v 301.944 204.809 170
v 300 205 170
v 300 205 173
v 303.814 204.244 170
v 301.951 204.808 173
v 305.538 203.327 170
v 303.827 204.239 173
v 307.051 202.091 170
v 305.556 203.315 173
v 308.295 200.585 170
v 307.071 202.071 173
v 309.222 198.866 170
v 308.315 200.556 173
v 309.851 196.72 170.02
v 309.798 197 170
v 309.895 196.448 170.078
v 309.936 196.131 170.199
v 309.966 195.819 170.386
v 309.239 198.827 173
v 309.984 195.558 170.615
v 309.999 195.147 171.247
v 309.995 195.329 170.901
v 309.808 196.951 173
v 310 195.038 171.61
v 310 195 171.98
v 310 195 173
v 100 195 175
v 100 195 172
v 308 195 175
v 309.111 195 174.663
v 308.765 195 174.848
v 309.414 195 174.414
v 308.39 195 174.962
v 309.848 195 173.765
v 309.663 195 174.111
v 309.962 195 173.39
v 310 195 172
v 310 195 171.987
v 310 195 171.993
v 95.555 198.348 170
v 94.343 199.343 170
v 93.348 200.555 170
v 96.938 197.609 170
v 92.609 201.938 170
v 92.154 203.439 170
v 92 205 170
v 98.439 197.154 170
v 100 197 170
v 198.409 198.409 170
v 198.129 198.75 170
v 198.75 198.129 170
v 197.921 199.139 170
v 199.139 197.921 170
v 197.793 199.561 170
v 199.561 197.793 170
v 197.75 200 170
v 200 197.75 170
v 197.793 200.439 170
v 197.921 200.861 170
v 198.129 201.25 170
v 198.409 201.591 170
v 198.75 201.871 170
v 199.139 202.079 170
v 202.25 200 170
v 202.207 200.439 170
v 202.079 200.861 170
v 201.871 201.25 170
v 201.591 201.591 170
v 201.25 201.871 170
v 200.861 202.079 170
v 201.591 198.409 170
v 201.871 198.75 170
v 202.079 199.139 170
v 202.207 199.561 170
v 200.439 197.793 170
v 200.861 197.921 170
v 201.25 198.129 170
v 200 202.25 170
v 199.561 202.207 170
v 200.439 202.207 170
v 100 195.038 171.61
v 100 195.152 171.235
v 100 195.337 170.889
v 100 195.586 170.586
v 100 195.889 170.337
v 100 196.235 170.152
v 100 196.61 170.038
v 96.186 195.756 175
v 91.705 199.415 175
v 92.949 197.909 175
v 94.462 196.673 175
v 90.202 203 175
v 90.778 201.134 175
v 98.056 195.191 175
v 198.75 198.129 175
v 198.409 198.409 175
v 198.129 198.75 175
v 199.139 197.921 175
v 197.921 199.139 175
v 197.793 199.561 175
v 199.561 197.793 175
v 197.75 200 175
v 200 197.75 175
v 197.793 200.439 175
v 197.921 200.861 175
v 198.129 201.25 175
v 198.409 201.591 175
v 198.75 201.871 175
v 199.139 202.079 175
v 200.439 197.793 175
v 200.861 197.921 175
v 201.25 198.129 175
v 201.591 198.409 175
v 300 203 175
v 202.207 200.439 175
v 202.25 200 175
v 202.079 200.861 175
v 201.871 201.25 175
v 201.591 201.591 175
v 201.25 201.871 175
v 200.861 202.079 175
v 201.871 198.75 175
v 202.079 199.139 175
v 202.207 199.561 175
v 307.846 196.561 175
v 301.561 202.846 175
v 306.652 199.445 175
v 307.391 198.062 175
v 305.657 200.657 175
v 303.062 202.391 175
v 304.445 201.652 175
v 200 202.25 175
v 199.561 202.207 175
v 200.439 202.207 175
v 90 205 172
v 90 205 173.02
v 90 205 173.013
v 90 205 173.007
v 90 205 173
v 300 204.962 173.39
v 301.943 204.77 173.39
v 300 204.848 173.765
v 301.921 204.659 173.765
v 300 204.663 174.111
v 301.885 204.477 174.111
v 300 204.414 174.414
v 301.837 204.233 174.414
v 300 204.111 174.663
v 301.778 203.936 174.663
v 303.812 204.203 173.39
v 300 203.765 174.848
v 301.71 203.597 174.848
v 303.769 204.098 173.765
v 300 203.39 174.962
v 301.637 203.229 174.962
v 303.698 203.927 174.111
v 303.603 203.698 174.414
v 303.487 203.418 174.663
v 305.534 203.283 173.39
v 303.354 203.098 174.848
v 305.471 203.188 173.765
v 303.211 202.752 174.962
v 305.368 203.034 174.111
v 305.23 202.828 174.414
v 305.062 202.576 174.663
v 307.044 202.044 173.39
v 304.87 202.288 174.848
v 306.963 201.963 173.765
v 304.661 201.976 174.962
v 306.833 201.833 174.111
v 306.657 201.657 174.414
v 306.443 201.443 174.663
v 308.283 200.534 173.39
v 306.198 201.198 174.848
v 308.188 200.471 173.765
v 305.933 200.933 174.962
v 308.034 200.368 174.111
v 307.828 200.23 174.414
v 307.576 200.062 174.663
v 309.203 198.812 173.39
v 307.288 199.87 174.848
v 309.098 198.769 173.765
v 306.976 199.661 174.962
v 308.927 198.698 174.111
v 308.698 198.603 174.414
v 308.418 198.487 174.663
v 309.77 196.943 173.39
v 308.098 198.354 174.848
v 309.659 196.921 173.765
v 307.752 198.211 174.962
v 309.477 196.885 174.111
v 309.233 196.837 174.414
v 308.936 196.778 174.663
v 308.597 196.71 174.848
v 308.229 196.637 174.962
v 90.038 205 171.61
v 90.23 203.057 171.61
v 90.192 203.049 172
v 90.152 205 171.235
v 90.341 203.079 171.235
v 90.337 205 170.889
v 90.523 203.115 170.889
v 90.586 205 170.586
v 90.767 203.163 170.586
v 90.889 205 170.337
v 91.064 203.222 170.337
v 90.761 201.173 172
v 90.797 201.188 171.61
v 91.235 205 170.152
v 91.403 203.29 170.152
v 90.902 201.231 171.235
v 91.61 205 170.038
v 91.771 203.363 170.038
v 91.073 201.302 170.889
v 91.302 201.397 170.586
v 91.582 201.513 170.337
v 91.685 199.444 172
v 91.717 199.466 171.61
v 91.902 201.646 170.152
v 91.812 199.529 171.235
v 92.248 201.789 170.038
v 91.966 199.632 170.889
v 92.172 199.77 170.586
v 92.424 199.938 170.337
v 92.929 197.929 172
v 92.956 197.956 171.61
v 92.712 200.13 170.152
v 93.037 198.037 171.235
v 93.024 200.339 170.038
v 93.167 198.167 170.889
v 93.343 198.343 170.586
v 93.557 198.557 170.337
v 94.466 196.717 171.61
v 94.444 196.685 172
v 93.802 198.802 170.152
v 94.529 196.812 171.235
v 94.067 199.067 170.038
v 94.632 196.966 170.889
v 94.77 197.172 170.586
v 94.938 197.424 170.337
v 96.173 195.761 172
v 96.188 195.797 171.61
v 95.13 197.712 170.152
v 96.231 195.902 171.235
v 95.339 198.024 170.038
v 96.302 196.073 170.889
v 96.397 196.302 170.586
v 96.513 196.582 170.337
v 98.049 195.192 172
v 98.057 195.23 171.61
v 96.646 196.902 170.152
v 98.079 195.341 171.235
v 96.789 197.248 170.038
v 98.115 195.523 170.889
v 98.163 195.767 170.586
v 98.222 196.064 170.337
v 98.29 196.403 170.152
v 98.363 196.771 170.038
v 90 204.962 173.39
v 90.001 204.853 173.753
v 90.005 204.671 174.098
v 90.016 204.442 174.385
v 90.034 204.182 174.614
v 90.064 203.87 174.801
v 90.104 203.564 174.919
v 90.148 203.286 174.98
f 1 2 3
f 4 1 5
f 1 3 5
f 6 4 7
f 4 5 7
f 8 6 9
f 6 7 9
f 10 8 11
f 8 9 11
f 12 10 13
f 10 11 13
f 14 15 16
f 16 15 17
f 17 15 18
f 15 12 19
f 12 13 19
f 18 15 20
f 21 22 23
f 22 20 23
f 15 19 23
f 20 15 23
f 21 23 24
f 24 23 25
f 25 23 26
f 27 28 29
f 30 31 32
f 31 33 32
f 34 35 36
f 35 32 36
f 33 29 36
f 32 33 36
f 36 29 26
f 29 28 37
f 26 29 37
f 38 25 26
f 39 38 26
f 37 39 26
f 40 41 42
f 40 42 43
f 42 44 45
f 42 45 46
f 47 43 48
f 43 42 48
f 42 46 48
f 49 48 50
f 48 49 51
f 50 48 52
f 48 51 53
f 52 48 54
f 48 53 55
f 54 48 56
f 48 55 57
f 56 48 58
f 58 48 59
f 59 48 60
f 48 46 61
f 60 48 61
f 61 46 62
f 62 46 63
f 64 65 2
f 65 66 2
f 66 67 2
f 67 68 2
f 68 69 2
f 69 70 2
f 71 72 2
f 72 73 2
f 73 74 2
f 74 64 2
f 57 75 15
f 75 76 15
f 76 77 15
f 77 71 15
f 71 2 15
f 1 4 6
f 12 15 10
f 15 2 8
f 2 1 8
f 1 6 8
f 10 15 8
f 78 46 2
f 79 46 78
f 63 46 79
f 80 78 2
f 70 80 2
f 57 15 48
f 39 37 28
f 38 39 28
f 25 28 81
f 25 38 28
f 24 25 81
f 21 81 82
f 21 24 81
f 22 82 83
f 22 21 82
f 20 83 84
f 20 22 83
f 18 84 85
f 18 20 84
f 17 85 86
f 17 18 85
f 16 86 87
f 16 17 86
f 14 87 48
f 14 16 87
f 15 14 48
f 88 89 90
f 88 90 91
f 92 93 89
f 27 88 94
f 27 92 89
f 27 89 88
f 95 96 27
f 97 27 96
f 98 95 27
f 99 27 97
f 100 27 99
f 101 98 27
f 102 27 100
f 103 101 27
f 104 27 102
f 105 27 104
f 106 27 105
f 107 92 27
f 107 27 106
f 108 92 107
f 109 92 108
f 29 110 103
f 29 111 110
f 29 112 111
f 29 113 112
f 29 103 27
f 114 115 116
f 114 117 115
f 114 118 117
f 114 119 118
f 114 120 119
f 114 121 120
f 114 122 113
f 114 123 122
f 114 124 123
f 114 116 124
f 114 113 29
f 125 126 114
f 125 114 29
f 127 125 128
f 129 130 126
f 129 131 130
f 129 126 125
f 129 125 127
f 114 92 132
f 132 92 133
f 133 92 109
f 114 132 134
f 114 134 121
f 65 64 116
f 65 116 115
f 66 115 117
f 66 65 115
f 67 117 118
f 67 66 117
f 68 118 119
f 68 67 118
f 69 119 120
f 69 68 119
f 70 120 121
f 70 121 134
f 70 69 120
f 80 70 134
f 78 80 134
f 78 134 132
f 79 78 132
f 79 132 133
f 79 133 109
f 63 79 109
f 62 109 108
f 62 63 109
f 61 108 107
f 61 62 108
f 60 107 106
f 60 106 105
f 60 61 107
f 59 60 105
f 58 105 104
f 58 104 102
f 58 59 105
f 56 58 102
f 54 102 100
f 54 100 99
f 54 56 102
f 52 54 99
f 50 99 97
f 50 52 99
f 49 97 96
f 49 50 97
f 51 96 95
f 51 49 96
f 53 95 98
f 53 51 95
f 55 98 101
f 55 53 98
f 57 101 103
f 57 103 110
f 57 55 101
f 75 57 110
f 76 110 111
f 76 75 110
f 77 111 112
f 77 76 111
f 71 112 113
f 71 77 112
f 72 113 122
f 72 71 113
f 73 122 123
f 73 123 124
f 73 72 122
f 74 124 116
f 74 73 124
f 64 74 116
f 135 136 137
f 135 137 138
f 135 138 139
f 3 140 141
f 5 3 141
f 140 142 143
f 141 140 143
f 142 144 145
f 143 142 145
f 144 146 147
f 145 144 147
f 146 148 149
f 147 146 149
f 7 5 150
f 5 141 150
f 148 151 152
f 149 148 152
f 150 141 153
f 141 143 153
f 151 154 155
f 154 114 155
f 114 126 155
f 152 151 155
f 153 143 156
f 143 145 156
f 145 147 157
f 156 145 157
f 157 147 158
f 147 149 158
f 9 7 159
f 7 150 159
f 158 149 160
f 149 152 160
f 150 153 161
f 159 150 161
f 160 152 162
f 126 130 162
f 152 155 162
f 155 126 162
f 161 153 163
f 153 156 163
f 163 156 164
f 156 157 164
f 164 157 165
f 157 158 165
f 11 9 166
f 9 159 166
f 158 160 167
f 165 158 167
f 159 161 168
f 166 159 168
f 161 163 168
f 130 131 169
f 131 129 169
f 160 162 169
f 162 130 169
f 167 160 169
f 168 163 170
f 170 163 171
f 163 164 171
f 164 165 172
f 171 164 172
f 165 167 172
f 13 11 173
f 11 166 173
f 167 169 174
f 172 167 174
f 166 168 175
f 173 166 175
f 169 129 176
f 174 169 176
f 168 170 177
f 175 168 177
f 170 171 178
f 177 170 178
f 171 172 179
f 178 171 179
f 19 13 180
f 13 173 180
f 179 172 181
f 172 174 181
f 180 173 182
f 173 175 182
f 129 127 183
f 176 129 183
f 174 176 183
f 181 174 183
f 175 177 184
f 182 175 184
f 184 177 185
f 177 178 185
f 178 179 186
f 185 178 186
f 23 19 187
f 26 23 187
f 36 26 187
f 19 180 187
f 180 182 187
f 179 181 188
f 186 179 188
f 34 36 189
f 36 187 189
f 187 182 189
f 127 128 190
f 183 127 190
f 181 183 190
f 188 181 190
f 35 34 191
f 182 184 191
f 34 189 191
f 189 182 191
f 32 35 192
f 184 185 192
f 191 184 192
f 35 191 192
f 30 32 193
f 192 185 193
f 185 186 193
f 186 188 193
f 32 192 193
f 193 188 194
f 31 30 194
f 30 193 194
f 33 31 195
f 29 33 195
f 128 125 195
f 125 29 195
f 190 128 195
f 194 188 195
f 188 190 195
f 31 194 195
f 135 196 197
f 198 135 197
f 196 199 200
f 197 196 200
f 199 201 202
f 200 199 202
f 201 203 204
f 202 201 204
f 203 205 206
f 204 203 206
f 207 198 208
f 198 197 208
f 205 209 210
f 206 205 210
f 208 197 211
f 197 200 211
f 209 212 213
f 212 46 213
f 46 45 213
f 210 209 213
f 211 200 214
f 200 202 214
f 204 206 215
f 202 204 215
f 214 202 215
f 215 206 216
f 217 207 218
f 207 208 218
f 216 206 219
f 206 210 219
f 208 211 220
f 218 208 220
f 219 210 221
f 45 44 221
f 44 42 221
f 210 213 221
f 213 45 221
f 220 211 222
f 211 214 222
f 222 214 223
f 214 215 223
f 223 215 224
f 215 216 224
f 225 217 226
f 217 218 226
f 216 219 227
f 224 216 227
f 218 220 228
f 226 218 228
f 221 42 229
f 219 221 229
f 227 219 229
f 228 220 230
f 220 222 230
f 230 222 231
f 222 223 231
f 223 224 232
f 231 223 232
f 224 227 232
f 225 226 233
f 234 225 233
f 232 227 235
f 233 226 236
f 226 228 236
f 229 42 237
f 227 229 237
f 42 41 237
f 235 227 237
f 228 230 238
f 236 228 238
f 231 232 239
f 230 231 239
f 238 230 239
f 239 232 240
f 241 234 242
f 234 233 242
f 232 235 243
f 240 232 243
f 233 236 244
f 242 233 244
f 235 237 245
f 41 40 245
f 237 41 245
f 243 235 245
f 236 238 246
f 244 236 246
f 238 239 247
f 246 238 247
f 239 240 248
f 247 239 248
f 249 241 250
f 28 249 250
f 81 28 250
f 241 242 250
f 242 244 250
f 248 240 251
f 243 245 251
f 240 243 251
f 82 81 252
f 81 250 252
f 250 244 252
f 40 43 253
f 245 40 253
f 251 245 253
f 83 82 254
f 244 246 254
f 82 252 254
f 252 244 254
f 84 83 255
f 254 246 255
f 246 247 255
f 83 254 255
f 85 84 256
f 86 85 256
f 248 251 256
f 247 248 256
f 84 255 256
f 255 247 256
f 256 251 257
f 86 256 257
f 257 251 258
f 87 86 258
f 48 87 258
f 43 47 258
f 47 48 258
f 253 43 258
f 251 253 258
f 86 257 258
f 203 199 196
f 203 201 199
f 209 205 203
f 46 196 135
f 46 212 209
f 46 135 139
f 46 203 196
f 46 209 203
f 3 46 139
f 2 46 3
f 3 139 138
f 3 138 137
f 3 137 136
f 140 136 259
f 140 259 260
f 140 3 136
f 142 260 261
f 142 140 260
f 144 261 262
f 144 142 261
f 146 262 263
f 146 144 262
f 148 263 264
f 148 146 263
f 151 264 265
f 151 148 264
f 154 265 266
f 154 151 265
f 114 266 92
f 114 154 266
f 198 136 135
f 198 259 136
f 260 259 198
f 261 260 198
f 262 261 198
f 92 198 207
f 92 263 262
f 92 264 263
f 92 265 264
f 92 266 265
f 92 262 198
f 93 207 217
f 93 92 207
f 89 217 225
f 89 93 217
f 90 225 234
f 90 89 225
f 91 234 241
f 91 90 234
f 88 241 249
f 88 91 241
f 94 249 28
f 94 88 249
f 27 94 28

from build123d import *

# Parameters (mm, degrees)
SKETCH28_W           = 220
SKETCH28_H           = 10
SKETCH28_R           = 2.25
BOSS_EXTRUDE11_DEPTH = 5
VARFILLET1_R         = 10
VARFILLET2_R         = 10
VARFILLET3_R         = 2
VARFILLET4_R         = 2


with BuildPart() as part:
    # Sketch28 → Boss-Extrude11 (new body)
    with BuildSketch(Plane.XY.offset(170)):
        with Locations((200, 200)):
            Rectangle(SKETCH28_W, SKETCH28_H)
        with Locations((200, 200)):
            Circle(SKETCH28_R, mode=Mode.SUBTRACT)
    extrude(amount=BOSS_EXTRUDE11_DEPTH)

    # VarFillet1
    varfillet1_edges = [part.edges().sort_by_distance(p)[0] for p in [
        (310, 205, 172.5),
    ]]
    fillet(varfillet1_edges, radius=VARFILLET1_R - 0.0001)  # a hair under: the kernel refuses the full size

    # VarFillet2
    varfillet2_edges = [part.edges().sort_by_distance(p)[0] for p in [
        (90, 195, 172.5),
    ]]
    fillet(varfillet2_edges, radius=VARFILLET2_R - 0.0001)  # a hair under: the kernel refuses the full size

    # VarFillet3
    varfillet3_edges = [part.edges().sort_by_distance(p)[0] for p in [
        (307.071097101, 202.071097101, 175),
    ]]
    fillet(varfillet3_edges, radius=VARFILLET3_R)

    # VarFillet4
    varfillet4_edges = [part.edges().sort_by_distance(p)[0] for p in [
        (92.928902899, 197.928902899, 170),
    ]]
    fillet(varfillet4_edges, radius=VARFILLET4_R)


solid = part.part
